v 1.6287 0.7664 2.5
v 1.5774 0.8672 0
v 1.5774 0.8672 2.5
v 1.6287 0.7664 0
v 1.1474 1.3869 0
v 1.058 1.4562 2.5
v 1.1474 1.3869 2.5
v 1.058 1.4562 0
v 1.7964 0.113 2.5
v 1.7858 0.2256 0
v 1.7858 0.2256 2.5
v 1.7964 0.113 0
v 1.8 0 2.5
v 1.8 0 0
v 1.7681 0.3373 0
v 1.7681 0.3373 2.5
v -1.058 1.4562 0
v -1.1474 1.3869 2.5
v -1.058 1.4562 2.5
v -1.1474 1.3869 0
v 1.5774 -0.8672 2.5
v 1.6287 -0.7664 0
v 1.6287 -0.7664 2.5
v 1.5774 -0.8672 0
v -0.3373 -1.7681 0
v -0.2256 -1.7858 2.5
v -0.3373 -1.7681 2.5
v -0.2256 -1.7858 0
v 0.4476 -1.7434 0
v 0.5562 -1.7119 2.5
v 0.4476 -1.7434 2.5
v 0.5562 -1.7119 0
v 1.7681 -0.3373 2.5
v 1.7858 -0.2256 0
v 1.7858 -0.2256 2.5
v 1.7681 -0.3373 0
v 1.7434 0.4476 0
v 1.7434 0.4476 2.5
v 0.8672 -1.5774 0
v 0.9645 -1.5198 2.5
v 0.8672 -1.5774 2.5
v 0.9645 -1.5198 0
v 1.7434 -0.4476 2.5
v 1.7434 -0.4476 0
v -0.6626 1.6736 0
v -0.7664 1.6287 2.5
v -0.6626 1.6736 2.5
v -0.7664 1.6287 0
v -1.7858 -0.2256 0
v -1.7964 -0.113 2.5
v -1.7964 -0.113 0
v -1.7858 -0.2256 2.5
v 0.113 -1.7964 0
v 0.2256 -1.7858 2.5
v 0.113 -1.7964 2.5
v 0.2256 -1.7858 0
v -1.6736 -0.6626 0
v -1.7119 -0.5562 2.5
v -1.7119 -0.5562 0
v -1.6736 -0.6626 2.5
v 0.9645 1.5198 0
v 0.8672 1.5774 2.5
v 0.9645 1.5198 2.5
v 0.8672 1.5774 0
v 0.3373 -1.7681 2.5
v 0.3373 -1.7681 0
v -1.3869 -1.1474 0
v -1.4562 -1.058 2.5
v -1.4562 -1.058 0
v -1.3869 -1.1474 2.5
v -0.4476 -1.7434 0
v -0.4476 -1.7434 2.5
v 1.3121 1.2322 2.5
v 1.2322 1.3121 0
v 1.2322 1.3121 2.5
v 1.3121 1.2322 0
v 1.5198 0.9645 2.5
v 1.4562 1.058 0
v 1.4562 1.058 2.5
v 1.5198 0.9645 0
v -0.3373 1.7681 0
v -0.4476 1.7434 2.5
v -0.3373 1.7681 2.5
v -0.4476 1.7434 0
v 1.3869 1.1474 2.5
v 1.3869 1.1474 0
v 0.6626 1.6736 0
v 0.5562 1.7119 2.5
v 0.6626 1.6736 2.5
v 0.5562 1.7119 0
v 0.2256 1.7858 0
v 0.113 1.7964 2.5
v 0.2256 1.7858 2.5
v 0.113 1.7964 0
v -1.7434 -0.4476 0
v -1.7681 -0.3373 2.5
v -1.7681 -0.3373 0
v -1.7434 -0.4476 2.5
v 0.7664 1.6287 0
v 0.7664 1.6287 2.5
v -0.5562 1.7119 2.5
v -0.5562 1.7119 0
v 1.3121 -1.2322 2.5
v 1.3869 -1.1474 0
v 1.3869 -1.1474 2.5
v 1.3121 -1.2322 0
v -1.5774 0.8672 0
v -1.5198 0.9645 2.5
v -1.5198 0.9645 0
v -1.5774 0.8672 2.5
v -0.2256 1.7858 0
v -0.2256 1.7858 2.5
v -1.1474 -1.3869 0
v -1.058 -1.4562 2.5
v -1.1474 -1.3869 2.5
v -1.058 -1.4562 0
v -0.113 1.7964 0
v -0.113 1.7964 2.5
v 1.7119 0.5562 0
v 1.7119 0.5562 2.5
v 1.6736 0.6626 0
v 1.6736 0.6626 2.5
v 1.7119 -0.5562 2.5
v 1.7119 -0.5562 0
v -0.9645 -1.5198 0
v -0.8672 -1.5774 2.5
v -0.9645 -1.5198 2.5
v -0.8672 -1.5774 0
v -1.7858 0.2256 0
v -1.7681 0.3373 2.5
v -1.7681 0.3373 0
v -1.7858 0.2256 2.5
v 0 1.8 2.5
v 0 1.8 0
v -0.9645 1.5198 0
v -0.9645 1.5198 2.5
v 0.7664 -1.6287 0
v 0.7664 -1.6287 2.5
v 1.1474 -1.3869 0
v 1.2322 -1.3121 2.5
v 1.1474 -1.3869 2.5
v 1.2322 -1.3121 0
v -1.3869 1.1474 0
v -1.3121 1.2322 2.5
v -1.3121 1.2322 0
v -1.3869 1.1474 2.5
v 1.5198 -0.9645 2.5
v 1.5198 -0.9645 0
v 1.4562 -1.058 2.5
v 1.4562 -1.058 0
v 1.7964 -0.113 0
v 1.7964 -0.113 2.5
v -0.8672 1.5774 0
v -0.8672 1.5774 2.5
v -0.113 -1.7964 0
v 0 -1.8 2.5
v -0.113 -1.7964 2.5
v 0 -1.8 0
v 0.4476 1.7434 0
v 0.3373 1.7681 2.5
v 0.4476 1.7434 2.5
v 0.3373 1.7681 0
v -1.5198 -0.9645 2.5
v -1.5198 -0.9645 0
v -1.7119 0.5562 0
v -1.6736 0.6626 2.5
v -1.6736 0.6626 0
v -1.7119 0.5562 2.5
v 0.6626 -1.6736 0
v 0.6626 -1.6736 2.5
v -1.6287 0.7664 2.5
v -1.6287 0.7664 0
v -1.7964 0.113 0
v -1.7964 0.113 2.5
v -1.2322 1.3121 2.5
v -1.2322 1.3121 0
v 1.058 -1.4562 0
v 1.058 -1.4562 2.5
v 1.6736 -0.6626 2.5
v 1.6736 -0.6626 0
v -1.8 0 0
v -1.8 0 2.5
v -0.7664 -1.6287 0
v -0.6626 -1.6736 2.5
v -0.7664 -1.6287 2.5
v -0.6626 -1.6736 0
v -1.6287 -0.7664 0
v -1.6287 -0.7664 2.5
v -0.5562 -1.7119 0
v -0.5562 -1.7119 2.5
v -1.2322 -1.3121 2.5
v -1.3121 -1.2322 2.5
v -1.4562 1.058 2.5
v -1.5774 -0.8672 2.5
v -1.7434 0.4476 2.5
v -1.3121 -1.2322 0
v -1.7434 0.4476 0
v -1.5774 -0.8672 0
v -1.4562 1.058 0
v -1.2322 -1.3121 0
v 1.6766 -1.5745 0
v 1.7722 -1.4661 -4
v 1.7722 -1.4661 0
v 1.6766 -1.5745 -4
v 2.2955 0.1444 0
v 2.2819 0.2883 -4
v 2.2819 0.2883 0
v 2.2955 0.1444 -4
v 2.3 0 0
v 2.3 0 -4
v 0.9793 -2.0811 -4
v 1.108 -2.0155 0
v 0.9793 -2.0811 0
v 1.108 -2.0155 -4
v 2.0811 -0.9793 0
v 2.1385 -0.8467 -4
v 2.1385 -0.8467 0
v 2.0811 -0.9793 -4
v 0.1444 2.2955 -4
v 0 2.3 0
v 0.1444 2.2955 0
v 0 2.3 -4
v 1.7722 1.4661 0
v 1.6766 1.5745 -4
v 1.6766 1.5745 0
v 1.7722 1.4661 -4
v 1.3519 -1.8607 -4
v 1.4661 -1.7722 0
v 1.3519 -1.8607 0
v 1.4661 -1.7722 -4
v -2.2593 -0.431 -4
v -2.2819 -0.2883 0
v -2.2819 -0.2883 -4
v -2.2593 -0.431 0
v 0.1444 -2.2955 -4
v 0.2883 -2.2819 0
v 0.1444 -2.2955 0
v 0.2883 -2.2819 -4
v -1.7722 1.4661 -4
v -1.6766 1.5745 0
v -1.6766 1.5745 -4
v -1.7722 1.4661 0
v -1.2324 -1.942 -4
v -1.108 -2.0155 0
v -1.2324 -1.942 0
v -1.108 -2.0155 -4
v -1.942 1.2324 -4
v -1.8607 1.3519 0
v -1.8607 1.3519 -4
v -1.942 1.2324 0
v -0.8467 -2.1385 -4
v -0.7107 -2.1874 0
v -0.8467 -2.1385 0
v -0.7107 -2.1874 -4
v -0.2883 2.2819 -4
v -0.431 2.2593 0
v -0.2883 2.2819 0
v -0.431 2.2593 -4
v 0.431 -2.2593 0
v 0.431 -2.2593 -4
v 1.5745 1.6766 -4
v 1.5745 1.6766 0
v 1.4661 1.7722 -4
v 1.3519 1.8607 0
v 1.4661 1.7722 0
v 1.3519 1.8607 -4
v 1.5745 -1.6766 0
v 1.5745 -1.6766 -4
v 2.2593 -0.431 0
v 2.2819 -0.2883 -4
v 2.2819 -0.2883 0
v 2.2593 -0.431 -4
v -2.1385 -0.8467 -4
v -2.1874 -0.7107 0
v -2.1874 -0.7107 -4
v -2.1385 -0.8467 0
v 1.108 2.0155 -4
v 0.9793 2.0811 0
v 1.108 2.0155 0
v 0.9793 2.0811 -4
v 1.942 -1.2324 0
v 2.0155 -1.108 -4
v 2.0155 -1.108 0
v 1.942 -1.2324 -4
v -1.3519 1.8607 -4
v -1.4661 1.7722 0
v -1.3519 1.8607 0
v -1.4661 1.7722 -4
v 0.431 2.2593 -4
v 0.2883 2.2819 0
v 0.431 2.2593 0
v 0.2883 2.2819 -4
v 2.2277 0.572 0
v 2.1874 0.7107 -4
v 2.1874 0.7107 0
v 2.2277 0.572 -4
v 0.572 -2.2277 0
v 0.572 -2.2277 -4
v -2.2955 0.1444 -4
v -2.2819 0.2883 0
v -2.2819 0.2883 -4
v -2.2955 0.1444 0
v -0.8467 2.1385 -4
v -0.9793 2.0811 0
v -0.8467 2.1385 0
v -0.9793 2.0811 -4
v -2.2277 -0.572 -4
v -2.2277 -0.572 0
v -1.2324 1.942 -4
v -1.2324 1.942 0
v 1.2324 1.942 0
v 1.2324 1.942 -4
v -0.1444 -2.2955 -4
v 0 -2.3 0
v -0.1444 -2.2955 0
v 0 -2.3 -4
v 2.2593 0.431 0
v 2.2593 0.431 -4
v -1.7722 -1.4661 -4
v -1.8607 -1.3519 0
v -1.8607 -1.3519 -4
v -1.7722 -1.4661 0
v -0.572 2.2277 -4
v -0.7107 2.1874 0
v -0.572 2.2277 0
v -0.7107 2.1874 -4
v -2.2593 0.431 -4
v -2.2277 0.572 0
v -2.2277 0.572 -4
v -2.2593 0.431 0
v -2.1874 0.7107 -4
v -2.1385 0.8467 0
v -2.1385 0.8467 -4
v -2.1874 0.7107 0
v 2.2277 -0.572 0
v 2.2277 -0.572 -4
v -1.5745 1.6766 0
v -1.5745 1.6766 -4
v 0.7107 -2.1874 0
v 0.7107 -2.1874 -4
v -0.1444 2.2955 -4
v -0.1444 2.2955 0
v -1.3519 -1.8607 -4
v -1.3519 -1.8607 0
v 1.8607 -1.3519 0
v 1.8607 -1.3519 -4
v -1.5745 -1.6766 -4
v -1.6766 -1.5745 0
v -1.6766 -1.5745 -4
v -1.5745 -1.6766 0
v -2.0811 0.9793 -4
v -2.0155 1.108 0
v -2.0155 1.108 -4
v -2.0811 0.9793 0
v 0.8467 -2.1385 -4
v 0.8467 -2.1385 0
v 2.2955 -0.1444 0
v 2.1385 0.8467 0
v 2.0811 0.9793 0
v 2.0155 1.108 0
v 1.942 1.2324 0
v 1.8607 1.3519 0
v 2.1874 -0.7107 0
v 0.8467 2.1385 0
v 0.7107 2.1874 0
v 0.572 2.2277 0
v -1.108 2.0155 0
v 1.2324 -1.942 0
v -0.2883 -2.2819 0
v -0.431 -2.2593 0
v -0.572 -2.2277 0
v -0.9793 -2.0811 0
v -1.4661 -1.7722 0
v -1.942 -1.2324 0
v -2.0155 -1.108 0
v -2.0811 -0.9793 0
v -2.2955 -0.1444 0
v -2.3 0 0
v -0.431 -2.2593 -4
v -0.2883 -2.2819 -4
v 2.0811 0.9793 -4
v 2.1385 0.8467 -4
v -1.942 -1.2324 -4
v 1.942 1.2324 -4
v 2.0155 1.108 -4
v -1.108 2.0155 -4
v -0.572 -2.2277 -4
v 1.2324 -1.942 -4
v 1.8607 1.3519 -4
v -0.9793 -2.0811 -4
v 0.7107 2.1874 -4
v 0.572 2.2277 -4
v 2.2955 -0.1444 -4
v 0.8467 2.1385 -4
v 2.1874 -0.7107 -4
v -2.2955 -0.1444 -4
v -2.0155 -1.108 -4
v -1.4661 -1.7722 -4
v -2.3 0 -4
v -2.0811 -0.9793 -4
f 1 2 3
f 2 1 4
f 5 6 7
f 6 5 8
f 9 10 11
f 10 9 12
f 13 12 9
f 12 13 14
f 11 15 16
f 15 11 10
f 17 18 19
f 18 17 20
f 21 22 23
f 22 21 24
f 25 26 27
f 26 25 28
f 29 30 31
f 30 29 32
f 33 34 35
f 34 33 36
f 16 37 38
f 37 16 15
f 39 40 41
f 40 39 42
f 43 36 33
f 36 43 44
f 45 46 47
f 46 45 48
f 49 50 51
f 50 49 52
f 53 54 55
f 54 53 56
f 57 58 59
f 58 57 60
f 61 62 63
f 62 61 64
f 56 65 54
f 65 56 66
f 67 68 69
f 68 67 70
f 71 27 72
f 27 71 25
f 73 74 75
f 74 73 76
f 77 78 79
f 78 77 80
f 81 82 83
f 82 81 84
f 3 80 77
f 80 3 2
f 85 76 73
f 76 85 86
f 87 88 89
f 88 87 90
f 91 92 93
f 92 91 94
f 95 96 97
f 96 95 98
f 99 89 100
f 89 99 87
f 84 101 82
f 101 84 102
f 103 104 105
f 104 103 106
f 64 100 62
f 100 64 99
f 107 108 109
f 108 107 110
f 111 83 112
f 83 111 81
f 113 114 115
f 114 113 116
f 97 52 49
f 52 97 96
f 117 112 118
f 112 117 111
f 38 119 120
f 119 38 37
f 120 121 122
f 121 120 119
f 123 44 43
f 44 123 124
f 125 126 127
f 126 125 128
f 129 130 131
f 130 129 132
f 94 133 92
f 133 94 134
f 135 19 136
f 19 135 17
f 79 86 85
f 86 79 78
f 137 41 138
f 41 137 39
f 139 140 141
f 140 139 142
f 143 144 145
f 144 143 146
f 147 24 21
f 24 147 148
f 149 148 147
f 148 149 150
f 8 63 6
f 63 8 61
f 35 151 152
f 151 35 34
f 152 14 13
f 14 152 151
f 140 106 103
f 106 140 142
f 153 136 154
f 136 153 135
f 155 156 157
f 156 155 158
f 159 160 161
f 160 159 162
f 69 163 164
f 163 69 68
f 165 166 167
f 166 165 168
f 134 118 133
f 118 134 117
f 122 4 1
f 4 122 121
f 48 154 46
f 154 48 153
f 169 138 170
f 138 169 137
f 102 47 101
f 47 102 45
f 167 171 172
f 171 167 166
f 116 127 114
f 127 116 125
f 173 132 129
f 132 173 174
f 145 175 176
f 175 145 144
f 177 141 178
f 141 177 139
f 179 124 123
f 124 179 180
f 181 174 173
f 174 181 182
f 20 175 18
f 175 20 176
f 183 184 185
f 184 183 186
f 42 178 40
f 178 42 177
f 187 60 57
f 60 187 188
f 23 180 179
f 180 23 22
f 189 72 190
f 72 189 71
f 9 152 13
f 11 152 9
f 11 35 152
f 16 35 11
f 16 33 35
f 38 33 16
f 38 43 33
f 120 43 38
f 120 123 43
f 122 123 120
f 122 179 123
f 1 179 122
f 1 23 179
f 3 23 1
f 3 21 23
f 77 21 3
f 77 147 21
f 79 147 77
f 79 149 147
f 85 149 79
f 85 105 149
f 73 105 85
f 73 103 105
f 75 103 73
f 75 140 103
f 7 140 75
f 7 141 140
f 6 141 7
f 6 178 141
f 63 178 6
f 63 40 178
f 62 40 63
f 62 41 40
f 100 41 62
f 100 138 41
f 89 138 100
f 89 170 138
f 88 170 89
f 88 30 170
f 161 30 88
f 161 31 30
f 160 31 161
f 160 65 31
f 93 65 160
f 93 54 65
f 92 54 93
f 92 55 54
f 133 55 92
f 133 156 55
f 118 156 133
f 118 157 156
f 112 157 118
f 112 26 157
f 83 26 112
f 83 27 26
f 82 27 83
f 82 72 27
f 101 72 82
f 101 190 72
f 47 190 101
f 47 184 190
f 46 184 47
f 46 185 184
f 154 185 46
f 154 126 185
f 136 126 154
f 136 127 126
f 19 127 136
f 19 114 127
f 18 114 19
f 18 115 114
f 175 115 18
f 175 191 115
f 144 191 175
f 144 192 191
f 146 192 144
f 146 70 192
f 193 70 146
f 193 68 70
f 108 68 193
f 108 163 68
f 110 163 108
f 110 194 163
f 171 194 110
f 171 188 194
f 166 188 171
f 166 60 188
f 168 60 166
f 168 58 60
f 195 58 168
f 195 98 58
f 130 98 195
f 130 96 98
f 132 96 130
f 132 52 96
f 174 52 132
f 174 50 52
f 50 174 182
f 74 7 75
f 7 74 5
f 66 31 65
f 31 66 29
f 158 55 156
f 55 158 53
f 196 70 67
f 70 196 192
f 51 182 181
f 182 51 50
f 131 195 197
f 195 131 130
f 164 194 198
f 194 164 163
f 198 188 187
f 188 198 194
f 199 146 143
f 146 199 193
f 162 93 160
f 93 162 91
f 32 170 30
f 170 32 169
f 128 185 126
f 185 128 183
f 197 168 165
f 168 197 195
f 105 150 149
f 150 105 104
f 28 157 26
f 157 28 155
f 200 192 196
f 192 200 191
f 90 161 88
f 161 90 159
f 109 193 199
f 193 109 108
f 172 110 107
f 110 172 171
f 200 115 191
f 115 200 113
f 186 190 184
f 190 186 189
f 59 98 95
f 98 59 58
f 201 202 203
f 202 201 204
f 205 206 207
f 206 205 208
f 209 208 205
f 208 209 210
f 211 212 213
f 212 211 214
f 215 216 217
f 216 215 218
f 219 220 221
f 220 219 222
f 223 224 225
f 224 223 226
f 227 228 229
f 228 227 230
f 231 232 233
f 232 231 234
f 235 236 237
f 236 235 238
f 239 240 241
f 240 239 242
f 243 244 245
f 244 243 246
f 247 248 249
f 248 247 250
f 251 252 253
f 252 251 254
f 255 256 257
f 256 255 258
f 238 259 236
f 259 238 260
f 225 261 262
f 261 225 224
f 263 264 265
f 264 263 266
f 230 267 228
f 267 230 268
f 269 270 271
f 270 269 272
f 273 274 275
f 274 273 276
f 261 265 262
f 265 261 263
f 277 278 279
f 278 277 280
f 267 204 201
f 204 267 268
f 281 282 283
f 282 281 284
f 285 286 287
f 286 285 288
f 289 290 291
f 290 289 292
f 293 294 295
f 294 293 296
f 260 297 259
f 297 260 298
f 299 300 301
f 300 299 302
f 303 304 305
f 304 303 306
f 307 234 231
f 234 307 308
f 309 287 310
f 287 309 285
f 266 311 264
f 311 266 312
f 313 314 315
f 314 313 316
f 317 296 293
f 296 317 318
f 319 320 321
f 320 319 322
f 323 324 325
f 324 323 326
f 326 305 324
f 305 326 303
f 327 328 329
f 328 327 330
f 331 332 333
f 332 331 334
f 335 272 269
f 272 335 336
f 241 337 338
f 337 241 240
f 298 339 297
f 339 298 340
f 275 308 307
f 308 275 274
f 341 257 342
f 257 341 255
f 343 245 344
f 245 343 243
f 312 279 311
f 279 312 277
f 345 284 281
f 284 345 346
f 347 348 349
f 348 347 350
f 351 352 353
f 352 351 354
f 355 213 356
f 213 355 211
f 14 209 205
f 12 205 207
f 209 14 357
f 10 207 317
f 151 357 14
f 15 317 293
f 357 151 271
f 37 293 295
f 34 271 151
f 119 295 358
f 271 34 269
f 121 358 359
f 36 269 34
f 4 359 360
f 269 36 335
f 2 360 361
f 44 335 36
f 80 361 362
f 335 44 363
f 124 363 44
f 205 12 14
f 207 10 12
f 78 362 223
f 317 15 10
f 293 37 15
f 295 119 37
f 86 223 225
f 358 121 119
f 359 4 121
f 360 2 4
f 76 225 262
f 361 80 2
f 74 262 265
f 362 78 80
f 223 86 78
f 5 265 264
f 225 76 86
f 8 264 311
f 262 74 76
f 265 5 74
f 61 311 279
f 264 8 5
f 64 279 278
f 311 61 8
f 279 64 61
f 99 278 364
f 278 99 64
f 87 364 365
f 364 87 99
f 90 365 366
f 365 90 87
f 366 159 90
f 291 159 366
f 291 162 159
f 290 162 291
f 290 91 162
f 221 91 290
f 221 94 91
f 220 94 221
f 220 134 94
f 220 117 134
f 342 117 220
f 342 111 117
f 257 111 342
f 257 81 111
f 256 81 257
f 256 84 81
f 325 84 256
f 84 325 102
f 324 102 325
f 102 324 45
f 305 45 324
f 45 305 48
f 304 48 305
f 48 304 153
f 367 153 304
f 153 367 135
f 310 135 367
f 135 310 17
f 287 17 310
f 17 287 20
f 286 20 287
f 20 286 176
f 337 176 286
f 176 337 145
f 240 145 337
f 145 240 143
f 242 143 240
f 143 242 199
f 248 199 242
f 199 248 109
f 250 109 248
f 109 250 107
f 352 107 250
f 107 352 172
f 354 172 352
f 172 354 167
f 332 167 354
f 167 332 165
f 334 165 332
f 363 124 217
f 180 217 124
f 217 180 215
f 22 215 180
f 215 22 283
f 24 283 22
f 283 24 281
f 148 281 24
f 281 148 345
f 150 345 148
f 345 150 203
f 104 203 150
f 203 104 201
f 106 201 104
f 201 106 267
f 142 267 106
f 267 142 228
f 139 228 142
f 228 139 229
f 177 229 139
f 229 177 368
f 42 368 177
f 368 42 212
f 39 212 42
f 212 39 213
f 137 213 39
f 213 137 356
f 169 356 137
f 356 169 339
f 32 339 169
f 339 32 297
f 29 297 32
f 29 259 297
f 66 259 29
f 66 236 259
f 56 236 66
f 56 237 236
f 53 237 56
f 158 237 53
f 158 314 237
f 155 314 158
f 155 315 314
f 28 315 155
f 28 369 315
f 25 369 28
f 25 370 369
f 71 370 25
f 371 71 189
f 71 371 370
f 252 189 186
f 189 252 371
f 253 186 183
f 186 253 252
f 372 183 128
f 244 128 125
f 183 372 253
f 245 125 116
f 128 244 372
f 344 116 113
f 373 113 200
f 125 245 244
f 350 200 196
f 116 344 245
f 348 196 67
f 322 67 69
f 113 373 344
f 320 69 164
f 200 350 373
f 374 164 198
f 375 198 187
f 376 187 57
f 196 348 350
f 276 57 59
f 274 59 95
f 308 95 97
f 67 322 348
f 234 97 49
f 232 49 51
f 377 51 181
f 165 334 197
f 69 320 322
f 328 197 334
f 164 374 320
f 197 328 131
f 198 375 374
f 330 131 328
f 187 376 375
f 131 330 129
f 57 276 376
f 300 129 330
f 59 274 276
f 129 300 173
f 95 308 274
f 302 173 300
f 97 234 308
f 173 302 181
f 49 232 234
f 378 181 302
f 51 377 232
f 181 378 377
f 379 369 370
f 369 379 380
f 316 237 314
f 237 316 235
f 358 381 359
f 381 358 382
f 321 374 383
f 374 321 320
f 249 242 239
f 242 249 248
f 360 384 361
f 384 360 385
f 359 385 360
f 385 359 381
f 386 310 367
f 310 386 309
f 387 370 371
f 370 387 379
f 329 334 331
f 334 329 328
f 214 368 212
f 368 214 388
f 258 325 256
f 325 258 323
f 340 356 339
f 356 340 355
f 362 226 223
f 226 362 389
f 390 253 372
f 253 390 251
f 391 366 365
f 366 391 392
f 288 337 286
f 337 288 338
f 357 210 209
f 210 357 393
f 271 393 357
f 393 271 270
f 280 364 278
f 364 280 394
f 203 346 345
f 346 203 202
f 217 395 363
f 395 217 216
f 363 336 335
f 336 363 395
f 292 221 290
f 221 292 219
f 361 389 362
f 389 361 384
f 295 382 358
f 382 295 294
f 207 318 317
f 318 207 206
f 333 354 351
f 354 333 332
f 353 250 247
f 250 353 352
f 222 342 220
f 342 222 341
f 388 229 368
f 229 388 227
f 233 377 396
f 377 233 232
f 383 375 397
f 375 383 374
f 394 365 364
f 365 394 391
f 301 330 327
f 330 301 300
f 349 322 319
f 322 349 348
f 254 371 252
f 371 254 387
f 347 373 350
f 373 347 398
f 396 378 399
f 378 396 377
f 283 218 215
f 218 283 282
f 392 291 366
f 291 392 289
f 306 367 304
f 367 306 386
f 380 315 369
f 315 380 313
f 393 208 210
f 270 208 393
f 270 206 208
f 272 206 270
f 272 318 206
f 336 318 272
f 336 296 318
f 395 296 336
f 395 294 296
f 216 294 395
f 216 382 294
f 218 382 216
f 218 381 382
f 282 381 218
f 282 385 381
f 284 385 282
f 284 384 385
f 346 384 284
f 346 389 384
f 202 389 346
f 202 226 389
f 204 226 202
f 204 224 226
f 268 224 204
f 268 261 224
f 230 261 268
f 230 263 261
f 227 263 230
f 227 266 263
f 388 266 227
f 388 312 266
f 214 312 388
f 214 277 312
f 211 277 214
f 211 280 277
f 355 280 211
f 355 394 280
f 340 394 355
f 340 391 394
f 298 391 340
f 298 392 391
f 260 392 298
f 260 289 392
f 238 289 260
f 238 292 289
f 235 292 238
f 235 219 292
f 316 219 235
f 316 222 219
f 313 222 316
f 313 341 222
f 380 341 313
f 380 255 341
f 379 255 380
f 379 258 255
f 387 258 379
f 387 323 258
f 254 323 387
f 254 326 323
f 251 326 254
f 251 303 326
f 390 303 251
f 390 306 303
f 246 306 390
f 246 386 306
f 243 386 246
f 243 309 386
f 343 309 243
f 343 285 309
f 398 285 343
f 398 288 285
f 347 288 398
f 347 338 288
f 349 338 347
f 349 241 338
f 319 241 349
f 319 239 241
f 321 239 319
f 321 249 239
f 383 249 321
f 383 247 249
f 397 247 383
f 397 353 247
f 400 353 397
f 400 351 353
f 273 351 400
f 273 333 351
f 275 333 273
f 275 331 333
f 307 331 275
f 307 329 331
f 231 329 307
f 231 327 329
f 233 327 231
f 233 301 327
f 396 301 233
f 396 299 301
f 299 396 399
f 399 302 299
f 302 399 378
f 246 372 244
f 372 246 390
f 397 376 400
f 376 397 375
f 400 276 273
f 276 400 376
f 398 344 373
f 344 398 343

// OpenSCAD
$fn=100; 

tolerance = 0.3;
module led_3mm(d=3){
    cylinder(r=d/2 + tolerance, h=5, center = true);
    translate([0, 0, -2]) cylinder(r=(d+1)/2 + tolerance, h=4, center = true);
}

led_3mm();
